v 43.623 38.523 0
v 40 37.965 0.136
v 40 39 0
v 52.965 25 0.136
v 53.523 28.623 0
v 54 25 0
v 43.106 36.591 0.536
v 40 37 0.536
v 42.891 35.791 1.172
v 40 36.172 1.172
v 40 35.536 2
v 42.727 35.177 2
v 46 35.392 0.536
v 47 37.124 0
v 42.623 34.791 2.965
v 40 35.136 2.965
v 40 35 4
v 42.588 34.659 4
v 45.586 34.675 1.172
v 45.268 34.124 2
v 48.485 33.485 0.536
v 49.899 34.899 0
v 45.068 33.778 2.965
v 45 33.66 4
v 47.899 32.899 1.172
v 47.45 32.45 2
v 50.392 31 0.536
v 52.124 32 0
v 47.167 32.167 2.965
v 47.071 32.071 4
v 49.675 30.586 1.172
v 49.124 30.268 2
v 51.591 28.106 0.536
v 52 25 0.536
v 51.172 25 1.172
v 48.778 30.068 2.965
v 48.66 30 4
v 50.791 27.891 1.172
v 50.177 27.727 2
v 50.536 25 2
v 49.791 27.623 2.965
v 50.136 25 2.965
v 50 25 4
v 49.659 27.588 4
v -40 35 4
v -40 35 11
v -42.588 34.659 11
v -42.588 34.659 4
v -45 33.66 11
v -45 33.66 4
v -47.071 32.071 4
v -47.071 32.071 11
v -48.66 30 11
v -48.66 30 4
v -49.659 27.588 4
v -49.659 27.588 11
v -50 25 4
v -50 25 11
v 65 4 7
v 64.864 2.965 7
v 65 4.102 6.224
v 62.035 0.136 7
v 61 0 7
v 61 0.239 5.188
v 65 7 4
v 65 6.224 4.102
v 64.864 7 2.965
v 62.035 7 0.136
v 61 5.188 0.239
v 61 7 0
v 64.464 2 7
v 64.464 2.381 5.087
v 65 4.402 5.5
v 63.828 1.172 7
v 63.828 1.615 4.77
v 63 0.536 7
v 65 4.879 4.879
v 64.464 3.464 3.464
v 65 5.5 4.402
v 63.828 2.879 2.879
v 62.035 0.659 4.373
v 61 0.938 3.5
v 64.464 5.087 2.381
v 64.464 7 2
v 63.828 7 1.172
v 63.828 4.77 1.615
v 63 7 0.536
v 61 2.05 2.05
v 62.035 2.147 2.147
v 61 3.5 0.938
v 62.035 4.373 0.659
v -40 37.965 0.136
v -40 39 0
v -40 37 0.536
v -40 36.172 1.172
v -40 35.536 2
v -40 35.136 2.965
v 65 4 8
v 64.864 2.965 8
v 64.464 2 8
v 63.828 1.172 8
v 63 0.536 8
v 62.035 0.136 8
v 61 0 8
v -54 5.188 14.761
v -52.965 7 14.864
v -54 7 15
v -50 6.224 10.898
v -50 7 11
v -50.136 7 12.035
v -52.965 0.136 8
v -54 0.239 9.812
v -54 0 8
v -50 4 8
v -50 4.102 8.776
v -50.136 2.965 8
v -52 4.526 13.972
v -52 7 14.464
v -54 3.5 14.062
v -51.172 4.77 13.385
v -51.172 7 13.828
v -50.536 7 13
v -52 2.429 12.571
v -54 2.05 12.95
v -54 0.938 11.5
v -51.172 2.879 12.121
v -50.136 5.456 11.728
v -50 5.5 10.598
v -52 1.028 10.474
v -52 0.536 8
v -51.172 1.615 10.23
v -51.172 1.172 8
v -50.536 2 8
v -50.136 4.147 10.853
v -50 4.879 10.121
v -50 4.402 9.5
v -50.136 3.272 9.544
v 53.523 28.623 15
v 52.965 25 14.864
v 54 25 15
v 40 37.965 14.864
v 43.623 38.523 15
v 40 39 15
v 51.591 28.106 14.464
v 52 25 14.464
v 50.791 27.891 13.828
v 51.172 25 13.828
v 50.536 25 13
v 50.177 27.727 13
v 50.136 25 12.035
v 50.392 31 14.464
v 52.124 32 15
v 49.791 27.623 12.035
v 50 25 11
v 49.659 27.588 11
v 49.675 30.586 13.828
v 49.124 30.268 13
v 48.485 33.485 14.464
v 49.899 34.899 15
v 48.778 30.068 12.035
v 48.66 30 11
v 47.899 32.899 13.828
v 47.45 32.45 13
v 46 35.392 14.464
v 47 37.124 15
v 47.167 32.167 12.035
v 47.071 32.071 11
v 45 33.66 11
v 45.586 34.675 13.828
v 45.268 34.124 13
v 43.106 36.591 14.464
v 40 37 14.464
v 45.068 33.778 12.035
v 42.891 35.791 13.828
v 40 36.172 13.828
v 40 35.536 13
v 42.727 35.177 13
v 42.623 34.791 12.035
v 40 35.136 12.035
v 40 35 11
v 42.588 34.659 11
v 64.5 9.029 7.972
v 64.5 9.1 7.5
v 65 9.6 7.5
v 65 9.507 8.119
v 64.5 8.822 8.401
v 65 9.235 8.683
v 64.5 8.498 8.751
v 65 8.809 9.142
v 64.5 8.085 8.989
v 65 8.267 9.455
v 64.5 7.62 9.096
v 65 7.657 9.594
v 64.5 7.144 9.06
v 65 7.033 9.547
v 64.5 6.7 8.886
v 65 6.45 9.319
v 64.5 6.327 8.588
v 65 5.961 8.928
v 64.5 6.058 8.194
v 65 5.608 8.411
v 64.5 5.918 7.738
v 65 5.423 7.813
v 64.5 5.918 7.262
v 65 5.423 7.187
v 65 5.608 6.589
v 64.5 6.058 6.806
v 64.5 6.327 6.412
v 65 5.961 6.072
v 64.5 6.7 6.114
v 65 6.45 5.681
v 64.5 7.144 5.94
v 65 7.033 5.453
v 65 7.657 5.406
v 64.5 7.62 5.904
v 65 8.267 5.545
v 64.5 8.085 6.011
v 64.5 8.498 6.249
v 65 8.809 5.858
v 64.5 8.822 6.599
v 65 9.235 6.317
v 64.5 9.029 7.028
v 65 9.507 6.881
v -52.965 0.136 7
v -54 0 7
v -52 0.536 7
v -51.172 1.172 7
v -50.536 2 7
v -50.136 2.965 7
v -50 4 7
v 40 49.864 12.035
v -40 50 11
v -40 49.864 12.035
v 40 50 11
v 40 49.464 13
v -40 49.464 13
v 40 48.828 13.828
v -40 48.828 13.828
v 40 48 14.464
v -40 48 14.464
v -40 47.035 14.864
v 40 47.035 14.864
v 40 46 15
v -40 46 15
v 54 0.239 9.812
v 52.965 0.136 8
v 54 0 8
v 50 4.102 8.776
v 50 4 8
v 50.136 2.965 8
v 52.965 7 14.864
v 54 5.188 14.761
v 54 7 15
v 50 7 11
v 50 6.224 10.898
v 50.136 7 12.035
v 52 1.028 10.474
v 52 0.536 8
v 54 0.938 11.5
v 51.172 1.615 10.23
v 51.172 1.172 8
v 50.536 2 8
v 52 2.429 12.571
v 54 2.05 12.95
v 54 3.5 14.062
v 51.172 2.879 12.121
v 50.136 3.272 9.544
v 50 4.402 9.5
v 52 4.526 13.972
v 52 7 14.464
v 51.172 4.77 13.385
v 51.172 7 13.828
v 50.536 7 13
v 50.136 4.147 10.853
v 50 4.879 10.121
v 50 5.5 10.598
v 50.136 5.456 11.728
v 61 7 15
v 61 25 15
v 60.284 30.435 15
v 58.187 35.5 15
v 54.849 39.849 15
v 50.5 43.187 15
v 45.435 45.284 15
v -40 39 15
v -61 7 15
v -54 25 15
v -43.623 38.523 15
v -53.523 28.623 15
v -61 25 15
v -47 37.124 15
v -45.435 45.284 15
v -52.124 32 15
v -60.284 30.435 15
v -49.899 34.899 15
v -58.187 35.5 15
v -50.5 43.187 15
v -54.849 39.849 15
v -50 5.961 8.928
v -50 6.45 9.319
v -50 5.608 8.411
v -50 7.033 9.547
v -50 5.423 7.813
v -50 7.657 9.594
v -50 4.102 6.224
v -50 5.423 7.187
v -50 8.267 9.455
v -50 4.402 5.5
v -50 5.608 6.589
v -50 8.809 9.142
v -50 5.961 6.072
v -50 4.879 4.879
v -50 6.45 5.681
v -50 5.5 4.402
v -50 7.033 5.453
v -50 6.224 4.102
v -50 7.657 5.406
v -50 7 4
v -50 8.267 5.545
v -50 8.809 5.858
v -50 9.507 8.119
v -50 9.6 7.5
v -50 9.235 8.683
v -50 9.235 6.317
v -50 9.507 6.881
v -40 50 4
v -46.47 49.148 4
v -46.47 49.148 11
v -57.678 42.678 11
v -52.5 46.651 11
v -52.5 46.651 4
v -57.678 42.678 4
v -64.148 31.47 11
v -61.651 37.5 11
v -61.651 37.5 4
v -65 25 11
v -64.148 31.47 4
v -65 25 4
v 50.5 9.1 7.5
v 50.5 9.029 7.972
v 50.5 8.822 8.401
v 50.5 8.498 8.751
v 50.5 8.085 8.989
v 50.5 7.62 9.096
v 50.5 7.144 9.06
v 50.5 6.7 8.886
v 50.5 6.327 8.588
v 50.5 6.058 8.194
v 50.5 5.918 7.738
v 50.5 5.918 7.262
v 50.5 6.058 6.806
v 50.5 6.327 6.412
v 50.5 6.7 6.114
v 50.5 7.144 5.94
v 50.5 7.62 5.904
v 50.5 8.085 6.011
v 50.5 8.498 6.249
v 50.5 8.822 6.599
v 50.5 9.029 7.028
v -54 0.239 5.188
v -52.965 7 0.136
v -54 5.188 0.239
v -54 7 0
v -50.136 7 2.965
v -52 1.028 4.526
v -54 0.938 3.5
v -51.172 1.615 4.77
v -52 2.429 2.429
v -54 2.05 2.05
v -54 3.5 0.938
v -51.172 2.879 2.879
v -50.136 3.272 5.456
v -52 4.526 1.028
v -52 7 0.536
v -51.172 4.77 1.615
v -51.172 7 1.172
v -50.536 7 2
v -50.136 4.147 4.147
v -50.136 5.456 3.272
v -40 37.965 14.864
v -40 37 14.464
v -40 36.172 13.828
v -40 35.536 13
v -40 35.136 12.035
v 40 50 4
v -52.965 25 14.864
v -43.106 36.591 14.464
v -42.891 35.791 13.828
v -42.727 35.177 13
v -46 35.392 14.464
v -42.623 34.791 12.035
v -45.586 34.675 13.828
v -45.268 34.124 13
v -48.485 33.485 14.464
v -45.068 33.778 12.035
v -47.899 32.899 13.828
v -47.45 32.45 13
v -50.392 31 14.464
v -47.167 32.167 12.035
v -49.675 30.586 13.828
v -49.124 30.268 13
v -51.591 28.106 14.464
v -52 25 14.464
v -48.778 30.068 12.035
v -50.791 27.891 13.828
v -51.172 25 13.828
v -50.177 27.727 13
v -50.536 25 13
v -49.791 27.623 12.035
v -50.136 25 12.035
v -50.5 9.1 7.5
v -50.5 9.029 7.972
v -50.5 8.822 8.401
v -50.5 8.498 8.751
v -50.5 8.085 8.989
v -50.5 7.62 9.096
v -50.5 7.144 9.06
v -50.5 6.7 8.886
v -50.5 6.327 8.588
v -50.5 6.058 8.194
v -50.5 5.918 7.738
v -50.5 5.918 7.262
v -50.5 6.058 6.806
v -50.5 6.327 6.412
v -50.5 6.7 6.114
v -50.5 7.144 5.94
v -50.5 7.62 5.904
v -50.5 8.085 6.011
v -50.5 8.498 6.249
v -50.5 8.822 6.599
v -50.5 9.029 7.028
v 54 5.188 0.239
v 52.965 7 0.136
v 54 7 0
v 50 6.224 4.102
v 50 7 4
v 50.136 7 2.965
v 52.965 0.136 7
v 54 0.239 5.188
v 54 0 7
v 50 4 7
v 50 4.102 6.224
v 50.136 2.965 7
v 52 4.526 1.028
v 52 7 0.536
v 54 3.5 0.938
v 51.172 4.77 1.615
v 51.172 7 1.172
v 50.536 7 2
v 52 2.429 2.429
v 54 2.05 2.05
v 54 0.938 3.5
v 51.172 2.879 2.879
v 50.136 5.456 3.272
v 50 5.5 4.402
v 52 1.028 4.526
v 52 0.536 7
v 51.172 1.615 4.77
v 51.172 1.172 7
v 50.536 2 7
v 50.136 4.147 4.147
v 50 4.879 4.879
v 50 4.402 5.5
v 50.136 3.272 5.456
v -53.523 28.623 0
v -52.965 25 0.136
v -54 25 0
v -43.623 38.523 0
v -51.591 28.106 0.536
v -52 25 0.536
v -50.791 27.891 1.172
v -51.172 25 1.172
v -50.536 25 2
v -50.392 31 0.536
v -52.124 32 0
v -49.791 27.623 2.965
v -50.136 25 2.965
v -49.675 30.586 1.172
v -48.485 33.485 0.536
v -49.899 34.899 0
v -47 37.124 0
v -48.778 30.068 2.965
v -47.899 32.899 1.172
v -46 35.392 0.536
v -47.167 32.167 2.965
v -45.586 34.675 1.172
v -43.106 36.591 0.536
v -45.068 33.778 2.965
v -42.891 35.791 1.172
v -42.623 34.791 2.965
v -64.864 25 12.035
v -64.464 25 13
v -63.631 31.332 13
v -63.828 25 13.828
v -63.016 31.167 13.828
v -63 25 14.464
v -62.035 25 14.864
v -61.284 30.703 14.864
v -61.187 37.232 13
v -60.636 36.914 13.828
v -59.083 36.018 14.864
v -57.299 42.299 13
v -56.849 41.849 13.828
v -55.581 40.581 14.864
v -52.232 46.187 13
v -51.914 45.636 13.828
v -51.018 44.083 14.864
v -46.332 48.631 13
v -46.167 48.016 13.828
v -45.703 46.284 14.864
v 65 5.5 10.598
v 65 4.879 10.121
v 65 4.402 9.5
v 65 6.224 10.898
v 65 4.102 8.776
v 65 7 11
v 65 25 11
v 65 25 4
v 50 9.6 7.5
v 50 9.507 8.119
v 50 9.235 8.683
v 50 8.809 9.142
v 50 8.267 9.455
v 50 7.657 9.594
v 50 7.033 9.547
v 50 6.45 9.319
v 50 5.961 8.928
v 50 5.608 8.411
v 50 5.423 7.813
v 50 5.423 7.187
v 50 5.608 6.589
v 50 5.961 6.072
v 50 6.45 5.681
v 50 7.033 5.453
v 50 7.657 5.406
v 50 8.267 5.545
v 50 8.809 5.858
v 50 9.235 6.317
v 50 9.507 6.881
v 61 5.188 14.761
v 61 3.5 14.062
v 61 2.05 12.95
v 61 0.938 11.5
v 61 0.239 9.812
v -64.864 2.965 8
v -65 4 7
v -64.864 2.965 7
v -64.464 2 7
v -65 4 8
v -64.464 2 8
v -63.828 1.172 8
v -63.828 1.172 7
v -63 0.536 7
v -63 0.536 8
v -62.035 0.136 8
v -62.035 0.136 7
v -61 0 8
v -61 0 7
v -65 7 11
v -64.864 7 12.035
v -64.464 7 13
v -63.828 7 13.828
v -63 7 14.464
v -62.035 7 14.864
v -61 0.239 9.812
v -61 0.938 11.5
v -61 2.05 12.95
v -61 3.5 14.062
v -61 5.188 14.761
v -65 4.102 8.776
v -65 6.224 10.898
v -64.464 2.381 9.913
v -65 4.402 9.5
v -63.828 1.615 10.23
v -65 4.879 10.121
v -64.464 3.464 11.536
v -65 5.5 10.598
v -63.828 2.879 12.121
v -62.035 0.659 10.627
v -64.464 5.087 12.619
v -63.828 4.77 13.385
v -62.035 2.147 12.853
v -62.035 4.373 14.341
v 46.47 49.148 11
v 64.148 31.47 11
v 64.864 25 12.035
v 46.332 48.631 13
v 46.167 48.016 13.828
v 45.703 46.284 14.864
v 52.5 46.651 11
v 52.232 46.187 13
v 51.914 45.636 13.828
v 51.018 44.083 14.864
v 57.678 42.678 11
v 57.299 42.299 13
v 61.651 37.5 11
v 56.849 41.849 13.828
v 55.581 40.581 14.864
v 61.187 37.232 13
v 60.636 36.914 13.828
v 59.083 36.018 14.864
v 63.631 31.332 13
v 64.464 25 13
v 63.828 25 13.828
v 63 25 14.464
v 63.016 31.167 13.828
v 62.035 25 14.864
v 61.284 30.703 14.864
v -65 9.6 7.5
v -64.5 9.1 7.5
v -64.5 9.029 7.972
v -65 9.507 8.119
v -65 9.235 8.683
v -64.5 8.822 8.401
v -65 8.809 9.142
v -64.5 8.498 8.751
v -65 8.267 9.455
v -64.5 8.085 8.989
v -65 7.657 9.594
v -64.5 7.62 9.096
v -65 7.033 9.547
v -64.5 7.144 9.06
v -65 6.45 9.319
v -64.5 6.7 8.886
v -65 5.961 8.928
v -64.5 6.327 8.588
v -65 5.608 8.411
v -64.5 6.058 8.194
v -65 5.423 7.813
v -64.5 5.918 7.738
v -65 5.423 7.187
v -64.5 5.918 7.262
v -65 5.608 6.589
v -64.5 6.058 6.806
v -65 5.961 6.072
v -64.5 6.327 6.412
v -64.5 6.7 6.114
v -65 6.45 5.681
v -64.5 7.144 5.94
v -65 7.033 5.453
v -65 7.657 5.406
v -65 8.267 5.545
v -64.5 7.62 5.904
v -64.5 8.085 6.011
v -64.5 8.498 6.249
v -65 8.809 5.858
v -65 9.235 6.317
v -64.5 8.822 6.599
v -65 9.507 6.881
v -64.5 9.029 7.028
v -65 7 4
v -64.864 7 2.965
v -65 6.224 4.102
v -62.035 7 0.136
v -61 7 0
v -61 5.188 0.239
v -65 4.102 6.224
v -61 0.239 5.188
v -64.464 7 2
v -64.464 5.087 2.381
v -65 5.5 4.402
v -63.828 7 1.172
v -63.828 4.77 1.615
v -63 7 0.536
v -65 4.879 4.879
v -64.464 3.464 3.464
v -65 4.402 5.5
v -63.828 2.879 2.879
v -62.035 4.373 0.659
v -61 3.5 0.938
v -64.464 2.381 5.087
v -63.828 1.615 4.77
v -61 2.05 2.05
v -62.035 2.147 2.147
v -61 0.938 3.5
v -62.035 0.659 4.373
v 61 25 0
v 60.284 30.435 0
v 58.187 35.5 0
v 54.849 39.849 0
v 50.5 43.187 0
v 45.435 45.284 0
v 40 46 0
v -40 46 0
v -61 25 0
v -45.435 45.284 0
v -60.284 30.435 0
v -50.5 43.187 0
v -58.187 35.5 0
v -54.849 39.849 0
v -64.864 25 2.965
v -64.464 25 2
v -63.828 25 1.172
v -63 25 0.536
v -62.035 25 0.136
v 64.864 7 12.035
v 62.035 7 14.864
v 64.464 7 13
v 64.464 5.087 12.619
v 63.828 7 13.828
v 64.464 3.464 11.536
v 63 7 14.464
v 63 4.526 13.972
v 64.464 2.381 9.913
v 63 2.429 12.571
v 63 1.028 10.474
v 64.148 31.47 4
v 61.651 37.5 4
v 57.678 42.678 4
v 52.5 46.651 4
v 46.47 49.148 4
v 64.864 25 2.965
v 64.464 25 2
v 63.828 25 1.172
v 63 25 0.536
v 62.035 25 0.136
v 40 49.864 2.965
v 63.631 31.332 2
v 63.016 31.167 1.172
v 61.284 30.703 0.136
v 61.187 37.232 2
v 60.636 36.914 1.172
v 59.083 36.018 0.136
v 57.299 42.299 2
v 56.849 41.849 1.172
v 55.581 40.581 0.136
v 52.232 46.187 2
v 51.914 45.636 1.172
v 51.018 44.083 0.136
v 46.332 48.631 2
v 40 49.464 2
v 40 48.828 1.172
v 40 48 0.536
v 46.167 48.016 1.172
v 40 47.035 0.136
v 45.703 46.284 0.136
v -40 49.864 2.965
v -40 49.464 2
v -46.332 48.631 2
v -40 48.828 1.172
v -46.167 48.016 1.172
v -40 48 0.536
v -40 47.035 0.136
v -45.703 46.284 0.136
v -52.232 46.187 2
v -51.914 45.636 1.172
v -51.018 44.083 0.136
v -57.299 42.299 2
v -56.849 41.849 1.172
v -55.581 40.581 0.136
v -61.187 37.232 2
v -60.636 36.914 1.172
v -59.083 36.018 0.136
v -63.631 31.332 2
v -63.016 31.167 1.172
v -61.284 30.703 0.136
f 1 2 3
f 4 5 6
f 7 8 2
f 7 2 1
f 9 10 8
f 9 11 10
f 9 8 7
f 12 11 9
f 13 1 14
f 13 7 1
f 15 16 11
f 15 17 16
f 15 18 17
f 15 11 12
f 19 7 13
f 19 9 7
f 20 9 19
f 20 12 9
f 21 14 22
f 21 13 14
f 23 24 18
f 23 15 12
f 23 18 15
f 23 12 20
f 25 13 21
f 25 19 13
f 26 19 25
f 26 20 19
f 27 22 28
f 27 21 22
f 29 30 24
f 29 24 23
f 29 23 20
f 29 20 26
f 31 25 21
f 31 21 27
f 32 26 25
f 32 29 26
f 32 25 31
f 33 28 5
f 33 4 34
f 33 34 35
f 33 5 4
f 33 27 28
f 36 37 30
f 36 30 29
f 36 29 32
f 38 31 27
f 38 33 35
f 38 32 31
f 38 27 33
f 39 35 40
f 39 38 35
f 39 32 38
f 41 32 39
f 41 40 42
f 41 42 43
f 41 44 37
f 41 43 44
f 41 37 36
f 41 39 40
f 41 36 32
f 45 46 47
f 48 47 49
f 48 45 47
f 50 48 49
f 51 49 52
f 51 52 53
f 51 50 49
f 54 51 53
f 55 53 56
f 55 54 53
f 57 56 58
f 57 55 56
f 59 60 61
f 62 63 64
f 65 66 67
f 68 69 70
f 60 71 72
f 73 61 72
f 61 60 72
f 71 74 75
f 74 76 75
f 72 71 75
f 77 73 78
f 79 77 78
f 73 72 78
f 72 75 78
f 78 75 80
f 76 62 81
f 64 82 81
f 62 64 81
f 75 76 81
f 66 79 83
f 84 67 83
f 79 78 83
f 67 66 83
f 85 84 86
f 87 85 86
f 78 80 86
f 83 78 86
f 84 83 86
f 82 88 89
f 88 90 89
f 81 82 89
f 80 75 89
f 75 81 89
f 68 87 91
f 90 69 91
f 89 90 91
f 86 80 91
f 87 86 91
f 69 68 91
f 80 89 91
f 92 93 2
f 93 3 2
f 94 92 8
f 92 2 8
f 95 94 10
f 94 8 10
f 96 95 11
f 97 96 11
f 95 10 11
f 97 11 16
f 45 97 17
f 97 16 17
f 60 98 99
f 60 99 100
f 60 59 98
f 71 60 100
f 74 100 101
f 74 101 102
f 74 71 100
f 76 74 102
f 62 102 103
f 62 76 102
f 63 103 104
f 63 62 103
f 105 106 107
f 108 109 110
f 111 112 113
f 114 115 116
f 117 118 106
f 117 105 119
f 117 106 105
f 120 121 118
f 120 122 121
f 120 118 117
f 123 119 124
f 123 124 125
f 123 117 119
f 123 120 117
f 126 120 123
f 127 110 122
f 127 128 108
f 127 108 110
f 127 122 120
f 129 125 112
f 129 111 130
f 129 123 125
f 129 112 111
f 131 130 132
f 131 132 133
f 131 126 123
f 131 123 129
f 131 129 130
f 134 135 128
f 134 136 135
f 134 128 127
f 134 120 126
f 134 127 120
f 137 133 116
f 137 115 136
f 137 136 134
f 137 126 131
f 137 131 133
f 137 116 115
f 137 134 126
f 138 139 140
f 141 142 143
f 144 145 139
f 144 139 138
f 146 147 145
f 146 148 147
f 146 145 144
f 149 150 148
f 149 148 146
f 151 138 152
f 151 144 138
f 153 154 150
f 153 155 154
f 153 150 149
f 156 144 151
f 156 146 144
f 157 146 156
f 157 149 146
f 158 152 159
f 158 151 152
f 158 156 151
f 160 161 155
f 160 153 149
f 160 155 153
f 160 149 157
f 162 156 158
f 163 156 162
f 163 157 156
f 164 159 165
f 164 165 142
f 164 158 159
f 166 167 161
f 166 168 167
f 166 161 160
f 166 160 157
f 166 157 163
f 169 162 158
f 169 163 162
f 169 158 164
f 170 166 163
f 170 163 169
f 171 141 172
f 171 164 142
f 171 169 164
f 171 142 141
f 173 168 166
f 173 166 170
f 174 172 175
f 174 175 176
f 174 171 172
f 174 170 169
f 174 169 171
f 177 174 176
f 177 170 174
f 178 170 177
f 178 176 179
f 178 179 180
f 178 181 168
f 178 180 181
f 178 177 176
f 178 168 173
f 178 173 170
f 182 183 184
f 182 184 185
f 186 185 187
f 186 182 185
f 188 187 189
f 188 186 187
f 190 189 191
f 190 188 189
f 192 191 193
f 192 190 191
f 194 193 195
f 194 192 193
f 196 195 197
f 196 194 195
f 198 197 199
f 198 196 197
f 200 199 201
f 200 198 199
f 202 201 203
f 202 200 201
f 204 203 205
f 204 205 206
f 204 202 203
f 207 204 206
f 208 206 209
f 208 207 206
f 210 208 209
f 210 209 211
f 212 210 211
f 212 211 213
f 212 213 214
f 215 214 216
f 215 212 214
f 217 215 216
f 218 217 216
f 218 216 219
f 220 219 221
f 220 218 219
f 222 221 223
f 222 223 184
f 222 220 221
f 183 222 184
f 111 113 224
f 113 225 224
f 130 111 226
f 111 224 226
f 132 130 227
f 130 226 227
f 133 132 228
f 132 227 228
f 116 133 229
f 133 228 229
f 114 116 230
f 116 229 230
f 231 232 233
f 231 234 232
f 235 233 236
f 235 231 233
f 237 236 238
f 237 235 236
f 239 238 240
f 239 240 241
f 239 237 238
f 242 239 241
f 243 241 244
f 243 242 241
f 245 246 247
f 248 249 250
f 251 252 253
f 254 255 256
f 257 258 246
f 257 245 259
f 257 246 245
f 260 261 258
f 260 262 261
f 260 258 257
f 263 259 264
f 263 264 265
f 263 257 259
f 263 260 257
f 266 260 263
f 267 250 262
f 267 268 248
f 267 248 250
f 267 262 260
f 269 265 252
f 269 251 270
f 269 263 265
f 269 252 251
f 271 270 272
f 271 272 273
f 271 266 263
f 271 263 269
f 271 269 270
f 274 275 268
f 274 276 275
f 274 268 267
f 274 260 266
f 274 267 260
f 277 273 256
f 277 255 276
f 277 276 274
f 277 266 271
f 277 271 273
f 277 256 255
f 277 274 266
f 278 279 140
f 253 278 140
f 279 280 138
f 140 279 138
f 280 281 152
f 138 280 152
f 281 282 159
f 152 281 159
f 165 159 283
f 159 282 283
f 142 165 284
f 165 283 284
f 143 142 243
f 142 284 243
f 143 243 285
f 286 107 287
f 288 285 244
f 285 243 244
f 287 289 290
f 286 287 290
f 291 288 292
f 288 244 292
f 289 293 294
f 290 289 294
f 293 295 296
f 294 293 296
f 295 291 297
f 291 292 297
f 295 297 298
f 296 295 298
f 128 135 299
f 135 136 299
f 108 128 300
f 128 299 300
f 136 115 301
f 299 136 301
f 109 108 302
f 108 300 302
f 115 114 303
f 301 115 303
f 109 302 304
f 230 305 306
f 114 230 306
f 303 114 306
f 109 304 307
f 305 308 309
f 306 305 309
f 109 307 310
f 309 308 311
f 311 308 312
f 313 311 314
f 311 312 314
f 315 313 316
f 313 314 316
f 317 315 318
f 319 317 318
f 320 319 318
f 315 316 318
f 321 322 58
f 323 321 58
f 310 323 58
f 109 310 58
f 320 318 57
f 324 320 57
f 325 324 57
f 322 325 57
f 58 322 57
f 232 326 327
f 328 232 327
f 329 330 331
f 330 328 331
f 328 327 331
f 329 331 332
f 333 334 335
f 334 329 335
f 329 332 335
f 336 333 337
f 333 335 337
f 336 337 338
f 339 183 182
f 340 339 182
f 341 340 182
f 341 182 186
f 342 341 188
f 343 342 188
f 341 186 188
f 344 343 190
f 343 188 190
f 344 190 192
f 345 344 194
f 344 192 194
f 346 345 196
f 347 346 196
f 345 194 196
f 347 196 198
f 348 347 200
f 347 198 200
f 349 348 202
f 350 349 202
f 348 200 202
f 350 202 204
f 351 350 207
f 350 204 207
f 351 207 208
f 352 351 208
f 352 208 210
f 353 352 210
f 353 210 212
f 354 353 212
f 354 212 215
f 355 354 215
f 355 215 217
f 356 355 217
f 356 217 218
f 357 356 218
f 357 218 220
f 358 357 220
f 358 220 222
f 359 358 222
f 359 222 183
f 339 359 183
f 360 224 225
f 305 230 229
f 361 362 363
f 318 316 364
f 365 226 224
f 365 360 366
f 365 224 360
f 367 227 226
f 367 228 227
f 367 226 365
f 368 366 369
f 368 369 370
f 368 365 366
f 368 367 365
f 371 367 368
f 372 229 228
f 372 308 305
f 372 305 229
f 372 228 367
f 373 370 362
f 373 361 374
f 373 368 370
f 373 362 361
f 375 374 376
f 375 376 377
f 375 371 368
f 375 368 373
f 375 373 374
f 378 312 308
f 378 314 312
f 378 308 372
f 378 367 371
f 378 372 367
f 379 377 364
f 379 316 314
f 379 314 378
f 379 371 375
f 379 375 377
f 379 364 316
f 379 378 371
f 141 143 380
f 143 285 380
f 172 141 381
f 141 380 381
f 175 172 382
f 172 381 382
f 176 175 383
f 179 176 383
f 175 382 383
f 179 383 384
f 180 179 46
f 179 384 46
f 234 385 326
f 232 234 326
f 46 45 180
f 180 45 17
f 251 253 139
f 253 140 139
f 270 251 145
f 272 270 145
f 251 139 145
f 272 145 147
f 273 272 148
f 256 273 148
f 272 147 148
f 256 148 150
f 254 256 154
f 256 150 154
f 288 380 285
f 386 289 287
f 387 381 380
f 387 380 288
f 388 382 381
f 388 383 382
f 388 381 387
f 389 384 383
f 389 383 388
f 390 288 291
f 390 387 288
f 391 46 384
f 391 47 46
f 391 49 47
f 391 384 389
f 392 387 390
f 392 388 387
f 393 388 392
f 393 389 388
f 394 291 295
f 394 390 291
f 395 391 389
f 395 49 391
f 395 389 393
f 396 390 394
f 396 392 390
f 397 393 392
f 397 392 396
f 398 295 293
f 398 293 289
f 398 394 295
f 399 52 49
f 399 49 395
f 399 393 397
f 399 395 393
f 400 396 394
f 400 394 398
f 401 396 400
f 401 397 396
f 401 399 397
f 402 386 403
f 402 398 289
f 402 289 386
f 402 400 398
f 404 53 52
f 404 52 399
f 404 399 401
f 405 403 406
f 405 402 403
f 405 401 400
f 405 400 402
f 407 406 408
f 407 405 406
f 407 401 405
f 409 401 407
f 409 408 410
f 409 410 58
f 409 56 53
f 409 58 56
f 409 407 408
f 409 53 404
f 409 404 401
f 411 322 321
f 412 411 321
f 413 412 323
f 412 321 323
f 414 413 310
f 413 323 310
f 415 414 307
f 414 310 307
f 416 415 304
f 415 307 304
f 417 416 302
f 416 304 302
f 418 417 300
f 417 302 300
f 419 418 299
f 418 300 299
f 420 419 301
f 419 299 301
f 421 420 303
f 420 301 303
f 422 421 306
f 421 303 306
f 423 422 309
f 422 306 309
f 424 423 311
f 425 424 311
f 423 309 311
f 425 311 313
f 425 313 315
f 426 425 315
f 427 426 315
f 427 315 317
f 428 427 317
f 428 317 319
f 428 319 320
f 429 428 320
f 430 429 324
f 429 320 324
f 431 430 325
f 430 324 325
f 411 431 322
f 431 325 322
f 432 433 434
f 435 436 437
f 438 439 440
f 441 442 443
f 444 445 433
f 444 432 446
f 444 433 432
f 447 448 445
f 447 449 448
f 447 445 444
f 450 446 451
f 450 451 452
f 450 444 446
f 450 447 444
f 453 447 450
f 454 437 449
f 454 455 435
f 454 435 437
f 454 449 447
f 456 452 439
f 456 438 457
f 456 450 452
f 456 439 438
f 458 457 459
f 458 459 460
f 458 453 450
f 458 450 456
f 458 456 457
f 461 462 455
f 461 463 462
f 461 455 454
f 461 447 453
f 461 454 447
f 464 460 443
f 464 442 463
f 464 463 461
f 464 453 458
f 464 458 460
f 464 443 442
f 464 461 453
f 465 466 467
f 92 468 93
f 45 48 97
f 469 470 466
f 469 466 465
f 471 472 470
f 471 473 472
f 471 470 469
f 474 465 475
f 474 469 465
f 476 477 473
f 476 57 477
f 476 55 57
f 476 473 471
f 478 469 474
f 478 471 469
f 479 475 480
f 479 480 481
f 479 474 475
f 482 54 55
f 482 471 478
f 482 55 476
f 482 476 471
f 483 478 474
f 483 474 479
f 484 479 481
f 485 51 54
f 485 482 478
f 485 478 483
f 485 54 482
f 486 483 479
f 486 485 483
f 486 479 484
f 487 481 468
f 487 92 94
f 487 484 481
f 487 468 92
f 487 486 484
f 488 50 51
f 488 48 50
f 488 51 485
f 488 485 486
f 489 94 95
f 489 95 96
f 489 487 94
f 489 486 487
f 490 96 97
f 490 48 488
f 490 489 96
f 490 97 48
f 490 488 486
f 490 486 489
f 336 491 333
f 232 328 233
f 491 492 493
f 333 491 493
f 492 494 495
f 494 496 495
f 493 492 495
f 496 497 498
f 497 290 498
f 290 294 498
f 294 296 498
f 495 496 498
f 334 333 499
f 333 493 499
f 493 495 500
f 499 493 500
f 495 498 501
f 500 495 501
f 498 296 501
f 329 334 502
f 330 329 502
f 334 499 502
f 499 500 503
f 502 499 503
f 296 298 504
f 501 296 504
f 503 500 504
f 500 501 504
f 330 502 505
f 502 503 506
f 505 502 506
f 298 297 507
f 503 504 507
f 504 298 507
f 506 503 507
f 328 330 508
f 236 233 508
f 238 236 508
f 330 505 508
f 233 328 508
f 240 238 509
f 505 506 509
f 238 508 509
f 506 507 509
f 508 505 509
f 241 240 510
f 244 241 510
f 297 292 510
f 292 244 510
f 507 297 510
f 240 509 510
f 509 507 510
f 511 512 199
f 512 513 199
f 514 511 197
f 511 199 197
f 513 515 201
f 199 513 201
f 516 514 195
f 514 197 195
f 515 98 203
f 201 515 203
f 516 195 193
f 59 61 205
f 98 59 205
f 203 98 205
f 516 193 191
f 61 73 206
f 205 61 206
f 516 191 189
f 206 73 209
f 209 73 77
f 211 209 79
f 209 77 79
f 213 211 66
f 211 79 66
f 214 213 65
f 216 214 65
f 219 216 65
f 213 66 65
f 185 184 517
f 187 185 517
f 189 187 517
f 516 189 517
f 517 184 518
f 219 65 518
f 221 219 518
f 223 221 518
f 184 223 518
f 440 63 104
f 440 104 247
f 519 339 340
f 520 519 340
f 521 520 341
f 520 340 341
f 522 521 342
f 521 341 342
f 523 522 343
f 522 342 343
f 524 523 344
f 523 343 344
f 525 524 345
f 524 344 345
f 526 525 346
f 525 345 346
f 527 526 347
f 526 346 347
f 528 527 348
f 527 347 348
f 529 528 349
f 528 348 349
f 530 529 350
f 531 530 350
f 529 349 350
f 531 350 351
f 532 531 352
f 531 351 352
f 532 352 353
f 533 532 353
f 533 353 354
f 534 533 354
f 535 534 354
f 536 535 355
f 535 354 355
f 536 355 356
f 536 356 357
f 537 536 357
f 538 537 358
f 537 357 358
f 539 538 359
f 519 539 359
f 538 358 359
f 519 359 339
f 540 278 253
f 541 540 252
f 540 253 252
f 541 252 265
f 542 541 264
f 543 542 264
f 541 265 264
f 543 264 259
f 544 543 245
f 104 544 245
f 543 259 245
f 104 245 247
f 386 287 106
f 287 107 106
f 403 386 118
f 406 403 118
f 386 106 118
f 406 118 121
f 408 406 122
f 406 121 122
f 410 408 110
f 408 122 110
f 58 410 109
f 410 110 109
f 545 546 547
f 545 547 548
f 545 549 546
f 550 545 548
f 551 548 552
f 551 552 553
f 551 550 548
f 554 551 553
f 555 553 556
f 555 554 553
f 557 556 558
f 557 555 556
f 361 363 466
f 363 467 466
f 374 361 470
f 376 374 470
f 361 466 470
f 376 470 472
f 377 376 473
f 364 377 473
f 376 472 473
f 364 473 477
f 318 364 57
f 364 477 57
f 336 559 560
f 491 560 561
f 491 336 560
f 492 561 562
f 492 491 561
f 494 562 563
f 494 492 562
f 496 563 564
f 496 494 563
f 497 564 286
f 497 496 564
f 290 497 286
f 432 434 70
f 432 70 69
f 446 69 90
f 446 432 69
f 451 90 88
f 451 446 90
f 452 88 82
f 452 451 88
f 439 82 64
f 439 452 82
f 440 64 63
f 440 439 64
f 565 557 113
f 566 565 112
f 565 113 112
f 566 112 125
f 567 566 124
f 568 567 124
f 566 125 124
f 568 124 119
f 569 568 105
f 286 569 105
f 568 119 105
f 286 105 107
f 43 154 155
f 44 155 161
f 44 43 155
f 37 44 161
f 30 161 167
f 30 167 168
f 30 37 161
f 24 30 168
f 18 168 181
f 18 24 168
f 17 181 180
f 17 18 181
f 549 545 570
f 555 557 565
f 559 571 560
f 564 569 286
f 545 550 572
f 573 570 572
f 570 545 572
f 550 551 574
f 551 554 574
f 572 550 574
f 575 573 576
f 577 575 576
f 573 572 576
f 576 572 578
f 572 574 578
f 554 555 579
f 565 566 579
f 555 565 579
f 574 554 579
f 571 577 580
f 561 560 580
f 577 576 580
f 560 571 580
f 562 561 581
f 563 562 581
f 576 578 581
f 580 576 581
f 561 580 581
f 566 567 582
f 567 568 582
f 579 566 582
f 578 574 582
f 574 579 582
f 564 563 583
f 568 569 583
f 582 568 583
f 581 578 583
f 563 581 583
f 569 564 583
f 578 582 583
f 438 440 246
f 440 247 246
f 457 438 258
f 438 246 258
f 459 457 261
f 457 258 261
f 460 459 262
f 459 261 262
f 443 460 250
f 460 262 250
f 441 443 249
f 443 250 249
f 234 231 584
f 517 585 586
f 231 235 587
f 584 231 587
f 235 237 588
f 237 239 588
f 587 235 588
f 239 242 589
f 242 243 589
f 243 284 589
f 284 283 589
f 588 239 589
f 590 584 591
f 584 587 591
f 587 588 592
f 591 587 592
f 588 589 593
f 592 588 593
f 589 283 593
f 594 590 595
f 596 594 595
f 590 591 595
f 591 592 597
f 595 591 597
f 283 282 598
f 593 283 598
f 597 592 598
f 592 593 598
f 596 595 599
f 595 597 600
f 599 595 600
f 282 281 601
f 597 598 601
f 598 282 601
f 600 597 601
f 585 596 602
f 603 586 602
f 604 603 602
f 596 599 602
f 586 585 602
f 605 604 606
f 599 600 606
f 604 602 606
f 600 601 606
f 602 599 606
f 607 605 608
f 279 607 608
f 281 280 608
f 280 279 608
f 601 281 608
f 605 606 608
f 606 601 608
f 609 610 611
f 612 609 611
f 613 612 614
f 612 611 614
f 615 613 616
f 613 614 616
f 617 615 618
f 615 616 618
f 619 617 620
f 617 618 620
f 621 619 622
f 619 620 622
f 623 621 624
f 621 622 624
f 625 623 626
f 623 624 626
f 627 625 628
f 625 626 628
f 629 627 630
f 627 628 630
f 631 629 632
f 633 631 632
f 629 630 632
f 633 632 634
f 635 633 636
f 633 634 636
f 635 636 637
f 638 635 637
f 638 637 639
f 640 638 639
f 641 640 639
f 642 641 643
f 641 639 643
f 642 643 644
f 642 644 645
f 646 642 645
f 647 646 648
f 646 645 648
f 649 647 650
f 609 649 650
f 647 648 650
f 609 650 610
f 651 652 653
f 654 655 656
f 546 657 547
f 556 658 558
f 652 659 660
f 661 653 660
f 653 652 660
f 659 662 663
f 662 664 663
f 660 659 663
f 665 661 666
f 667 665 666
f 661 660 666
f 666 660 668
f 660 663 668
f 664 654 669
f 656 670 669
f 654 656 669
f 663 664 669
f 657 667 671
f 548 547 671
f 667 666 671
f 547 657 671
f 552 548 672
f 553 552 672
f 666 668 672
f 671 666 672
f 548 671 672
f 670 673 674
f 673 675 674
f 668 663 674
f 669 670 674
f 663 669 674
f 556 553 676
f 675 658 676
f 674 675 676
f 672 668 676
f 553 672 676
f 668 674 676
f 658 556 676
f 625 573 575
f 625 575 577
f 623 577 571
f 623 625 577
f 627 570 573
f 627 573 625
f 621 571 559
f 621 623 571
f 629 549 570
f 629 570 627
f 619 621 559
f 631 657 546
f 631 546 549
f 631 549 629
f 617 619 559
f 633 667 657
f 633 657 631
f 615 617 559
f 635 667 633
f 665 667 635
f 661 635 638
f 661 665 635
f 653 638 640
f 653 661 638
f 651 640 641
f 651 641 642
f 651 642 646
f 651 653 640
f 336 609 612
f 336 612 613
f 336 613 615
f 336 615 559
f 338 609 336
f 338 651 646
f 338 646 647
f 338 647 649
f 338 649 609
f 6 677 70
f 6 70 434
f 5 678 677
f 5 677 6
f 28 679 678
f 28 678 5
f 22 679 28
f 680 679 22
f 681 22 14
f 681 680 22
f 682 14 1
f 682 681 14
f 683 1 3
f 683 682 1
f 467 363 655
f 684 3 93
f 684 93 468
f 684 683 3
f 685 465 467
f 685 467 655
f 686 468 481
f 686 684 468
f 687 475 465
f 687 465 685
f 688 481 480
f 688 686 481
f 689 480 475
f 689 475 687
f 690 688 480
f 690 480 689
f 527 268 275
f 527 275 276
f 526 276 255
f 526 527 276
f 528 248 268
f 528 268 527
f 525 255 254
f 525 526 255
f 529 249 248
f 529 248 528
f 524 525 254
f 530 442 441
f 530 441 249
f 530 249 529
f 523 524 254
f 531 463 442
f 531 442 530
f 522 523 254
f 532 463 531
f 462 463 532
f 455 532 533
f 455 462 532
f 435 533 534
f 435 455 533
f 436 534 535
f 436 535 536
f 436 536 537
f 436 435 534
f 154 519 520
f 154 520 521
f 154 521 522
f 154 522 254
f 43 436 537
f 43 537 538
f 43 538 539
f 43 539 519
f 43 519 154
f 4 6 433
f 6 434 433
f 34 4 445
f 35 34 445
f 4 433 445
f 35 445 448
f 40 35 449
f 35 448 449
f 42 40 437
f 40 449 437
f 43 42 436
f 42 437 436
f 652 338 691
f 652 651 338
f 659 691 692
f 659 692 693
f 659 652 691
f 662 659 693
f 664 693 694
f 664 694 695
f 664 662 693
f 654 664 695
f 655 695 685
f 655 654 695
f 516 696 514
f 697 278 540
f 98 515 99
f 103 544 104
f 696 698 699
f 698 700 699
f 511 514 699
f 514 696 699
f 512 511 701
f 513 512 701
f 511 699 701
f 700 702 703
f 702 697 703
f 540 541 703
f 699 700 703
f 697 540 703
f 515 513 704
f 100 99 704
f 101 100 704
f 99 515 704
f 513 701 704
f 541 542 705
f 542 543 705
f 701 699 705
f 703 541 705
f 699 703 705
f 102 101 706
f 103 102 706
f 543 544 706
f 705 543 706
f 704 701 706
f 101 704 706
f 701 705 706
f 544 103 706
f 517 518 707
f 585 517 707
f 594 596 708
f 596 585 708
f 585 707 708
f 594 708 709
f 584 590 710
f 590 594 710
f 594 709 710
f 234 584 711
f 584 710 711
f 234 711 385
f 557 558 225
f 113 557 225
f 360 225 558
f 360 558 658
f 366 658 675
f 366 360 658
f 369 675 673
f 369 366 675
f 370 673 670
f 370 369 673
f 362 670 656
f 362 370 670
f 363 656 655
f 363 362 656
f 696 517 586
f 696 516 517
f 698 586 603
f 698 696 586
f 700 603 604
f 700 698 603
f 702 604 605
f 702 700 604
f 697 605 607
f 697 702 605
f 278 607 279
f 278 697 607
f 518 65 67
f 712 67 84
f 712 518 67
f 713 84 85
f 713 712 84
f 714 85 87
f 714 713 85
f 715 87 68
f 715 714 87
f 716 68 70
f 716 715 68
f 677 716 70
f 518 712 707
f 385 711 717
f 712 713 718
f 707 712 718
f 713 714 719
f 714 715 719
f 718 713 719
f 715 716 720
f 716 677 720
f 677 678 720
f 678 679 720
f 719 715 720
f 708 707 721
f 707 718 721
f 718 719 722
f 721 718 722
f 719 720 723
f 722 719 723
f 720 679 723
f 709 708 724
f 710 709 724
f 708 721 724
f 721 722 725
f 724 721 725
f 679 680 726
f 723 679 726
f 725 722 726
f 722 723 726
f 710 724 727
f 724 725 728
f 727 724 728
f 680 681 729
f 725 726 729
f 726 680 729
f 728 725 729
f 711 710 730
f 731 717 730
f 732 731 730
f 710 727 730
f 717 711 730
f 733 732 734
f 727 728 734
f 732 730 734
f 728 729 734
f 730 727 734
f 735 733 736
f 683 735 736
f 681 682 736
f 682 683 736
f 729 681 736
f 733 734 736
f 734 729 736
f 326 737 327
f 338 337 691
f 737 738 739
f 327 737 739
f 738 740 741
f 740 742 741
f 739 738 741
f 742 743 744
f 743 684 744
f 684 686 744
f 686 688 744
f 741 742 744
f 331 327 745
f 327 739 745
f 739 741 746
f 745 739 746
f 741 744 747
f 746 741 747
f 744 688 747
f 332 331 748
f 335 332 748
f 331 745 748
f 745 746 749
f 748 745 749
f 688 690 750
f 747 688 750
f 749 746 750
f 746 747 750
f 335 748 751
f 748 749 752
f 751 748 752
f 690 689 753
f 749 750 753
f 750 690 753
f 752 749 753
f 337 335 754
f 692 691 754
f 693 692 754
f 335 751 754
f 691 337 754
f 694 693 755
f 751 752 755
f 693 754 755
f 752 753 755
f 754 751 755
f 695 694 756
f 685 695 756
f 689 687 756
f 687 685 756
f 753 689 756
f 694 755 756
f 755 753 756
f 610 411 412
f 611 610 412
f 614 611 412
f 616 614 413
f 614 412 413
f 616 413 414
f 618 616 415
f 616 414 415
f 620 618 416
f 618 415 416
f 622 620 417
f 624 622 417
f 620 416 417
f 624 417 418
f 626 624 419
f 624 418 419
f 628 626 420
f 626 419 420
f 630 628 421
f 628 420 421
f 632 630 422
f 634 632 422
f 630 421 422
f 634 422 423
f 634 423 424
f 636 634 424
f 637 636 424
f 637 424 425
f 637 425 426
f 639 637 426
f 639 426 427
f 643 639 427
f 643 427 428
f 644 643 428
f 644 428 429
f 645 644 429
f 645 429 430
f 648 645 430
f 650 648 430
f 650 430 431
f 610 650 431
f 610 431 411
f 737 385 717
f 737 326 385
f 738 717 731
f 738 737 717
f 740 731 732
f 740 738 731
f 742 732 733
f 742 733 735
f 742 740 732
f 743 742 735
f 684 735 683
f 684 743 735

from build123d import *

# Parameters (mm, degrees)
PAD_DEPTH    = 15
SKETCH001_R  = 1.6
POCKET_DEPTH = 130.001
FILLET_R     = 7
FILLET001_R  = 4
CHAMFER_SIZE = 0.5


with BuildPart() as part:
    # Sketch → Pad (new body)
    with BuildSketch(Plane.XY):
        with BuildLine():
            Line((-65, 0), (-65, 25))
            ThreePointArc((-40, 50), (-57.67767, 42.67767), (-65, 25))
            Line((-40, 50), (0, 50))
            Line((40, 50), (0, 50))
            ThreePointArc((65, 25), (57.67767, 42.67767), (40, 50))
            Line((65, 0), (65, 25))
            Line((65, 0), (50, 0))
            Line((50, 0), (50, 25))
            ThreePointArc((50, 25), (47.071068, 32.071068), (40, 35))
            Line((0, 35), (40, 35))
            Line((0, 35), (-40, 35))
            ThreePointArc((-40, 35), (-47.071068, 32.071068), (-50, 25))
            Line((-50, 0), (-50, 25))
            Line((-65, 0), (-50, 0))
        make_face()
    extrude(amount=PAD_DEPTH)

    # Sketch001 (on Face8 of Pad) → Pocket (cut, through all)
    with BuildSketch(Plane.YZ.offset(65)):
        with Locations((7.5, 7.5)):
            Circle(SKETCH001_R)
    extrude(amount=-POCKET_DEPTH, mode=Mode.SUBTRACT)

    # Fillet
    fillet_edges = [part.edges().sort_by_distance(p)[0] for p in [
        (57.5, 0, 0),
        (57.5, 0, 15),
        (-57.5, 0, 0),
        (-57.5, 0, 15),
    ]]
    fillet(fillet_edges, radius=FILLET_R)

    # Fillet001
    fillet001_edges = [part.edges().sort_by_distance(p)[0] for p in [
        (65, 2.050253, 12.949747),
        (0, 35, 0),
        (65, 0, 7.5),
        (65, 2.050253, 2.050253),
        (50, 2.050253, 2.050253),
        (50, 0, 7.5),
        (50, 2.050253, 12.949747),
        (50, 16, 15),
        (47.071068, 32.071068, 15),
        (65, 16, 15),
        (65, 16, 0),
        (57.67767, 42.67767, 15),
        (57.67767, 42.67767, 0),
        (0, 35, 15),
        (0, 50, 15),
        (-47.071068, 32.071068, 15),
        (-47.071068, 32.071068, 0),
        (-57.67767, 42.67767, 15),
        (-65, 16, 15),
        (-50, 16, 15),
        (-50, 2.050253, 12.949747),
        (-65, 2.050253, 12.949747),
        (-65, 0, 7.5),
        (-50, 0, 7.5),
        (-65, 2.050253, 2.050253),
        (-50, 2.050253, 2.050253),
        (-50, 16, 0),
        (-65, 16, 0),
        (-57.67767, 42.67767, 0),
        (0, 50, 0),
        (47.071068, 32.071068, 0),
        (50, 16, 0),
    ]]
    fillet(fillet001_edges, radius=FILLET001_R)

    # Chamfer
    chamfer_edges = [part.edges().sort_by_distance(p)[0] for p in [
        (-50, 5.9, 7.5),
        (65, 5.9, 7.5),
        (50, 5.9, 7.5),
        (-65, 5.9, 7.5),
    ]]
    chamfer(chamfer_edges, length=CHAMFER_SIZE)


solid = part.part
